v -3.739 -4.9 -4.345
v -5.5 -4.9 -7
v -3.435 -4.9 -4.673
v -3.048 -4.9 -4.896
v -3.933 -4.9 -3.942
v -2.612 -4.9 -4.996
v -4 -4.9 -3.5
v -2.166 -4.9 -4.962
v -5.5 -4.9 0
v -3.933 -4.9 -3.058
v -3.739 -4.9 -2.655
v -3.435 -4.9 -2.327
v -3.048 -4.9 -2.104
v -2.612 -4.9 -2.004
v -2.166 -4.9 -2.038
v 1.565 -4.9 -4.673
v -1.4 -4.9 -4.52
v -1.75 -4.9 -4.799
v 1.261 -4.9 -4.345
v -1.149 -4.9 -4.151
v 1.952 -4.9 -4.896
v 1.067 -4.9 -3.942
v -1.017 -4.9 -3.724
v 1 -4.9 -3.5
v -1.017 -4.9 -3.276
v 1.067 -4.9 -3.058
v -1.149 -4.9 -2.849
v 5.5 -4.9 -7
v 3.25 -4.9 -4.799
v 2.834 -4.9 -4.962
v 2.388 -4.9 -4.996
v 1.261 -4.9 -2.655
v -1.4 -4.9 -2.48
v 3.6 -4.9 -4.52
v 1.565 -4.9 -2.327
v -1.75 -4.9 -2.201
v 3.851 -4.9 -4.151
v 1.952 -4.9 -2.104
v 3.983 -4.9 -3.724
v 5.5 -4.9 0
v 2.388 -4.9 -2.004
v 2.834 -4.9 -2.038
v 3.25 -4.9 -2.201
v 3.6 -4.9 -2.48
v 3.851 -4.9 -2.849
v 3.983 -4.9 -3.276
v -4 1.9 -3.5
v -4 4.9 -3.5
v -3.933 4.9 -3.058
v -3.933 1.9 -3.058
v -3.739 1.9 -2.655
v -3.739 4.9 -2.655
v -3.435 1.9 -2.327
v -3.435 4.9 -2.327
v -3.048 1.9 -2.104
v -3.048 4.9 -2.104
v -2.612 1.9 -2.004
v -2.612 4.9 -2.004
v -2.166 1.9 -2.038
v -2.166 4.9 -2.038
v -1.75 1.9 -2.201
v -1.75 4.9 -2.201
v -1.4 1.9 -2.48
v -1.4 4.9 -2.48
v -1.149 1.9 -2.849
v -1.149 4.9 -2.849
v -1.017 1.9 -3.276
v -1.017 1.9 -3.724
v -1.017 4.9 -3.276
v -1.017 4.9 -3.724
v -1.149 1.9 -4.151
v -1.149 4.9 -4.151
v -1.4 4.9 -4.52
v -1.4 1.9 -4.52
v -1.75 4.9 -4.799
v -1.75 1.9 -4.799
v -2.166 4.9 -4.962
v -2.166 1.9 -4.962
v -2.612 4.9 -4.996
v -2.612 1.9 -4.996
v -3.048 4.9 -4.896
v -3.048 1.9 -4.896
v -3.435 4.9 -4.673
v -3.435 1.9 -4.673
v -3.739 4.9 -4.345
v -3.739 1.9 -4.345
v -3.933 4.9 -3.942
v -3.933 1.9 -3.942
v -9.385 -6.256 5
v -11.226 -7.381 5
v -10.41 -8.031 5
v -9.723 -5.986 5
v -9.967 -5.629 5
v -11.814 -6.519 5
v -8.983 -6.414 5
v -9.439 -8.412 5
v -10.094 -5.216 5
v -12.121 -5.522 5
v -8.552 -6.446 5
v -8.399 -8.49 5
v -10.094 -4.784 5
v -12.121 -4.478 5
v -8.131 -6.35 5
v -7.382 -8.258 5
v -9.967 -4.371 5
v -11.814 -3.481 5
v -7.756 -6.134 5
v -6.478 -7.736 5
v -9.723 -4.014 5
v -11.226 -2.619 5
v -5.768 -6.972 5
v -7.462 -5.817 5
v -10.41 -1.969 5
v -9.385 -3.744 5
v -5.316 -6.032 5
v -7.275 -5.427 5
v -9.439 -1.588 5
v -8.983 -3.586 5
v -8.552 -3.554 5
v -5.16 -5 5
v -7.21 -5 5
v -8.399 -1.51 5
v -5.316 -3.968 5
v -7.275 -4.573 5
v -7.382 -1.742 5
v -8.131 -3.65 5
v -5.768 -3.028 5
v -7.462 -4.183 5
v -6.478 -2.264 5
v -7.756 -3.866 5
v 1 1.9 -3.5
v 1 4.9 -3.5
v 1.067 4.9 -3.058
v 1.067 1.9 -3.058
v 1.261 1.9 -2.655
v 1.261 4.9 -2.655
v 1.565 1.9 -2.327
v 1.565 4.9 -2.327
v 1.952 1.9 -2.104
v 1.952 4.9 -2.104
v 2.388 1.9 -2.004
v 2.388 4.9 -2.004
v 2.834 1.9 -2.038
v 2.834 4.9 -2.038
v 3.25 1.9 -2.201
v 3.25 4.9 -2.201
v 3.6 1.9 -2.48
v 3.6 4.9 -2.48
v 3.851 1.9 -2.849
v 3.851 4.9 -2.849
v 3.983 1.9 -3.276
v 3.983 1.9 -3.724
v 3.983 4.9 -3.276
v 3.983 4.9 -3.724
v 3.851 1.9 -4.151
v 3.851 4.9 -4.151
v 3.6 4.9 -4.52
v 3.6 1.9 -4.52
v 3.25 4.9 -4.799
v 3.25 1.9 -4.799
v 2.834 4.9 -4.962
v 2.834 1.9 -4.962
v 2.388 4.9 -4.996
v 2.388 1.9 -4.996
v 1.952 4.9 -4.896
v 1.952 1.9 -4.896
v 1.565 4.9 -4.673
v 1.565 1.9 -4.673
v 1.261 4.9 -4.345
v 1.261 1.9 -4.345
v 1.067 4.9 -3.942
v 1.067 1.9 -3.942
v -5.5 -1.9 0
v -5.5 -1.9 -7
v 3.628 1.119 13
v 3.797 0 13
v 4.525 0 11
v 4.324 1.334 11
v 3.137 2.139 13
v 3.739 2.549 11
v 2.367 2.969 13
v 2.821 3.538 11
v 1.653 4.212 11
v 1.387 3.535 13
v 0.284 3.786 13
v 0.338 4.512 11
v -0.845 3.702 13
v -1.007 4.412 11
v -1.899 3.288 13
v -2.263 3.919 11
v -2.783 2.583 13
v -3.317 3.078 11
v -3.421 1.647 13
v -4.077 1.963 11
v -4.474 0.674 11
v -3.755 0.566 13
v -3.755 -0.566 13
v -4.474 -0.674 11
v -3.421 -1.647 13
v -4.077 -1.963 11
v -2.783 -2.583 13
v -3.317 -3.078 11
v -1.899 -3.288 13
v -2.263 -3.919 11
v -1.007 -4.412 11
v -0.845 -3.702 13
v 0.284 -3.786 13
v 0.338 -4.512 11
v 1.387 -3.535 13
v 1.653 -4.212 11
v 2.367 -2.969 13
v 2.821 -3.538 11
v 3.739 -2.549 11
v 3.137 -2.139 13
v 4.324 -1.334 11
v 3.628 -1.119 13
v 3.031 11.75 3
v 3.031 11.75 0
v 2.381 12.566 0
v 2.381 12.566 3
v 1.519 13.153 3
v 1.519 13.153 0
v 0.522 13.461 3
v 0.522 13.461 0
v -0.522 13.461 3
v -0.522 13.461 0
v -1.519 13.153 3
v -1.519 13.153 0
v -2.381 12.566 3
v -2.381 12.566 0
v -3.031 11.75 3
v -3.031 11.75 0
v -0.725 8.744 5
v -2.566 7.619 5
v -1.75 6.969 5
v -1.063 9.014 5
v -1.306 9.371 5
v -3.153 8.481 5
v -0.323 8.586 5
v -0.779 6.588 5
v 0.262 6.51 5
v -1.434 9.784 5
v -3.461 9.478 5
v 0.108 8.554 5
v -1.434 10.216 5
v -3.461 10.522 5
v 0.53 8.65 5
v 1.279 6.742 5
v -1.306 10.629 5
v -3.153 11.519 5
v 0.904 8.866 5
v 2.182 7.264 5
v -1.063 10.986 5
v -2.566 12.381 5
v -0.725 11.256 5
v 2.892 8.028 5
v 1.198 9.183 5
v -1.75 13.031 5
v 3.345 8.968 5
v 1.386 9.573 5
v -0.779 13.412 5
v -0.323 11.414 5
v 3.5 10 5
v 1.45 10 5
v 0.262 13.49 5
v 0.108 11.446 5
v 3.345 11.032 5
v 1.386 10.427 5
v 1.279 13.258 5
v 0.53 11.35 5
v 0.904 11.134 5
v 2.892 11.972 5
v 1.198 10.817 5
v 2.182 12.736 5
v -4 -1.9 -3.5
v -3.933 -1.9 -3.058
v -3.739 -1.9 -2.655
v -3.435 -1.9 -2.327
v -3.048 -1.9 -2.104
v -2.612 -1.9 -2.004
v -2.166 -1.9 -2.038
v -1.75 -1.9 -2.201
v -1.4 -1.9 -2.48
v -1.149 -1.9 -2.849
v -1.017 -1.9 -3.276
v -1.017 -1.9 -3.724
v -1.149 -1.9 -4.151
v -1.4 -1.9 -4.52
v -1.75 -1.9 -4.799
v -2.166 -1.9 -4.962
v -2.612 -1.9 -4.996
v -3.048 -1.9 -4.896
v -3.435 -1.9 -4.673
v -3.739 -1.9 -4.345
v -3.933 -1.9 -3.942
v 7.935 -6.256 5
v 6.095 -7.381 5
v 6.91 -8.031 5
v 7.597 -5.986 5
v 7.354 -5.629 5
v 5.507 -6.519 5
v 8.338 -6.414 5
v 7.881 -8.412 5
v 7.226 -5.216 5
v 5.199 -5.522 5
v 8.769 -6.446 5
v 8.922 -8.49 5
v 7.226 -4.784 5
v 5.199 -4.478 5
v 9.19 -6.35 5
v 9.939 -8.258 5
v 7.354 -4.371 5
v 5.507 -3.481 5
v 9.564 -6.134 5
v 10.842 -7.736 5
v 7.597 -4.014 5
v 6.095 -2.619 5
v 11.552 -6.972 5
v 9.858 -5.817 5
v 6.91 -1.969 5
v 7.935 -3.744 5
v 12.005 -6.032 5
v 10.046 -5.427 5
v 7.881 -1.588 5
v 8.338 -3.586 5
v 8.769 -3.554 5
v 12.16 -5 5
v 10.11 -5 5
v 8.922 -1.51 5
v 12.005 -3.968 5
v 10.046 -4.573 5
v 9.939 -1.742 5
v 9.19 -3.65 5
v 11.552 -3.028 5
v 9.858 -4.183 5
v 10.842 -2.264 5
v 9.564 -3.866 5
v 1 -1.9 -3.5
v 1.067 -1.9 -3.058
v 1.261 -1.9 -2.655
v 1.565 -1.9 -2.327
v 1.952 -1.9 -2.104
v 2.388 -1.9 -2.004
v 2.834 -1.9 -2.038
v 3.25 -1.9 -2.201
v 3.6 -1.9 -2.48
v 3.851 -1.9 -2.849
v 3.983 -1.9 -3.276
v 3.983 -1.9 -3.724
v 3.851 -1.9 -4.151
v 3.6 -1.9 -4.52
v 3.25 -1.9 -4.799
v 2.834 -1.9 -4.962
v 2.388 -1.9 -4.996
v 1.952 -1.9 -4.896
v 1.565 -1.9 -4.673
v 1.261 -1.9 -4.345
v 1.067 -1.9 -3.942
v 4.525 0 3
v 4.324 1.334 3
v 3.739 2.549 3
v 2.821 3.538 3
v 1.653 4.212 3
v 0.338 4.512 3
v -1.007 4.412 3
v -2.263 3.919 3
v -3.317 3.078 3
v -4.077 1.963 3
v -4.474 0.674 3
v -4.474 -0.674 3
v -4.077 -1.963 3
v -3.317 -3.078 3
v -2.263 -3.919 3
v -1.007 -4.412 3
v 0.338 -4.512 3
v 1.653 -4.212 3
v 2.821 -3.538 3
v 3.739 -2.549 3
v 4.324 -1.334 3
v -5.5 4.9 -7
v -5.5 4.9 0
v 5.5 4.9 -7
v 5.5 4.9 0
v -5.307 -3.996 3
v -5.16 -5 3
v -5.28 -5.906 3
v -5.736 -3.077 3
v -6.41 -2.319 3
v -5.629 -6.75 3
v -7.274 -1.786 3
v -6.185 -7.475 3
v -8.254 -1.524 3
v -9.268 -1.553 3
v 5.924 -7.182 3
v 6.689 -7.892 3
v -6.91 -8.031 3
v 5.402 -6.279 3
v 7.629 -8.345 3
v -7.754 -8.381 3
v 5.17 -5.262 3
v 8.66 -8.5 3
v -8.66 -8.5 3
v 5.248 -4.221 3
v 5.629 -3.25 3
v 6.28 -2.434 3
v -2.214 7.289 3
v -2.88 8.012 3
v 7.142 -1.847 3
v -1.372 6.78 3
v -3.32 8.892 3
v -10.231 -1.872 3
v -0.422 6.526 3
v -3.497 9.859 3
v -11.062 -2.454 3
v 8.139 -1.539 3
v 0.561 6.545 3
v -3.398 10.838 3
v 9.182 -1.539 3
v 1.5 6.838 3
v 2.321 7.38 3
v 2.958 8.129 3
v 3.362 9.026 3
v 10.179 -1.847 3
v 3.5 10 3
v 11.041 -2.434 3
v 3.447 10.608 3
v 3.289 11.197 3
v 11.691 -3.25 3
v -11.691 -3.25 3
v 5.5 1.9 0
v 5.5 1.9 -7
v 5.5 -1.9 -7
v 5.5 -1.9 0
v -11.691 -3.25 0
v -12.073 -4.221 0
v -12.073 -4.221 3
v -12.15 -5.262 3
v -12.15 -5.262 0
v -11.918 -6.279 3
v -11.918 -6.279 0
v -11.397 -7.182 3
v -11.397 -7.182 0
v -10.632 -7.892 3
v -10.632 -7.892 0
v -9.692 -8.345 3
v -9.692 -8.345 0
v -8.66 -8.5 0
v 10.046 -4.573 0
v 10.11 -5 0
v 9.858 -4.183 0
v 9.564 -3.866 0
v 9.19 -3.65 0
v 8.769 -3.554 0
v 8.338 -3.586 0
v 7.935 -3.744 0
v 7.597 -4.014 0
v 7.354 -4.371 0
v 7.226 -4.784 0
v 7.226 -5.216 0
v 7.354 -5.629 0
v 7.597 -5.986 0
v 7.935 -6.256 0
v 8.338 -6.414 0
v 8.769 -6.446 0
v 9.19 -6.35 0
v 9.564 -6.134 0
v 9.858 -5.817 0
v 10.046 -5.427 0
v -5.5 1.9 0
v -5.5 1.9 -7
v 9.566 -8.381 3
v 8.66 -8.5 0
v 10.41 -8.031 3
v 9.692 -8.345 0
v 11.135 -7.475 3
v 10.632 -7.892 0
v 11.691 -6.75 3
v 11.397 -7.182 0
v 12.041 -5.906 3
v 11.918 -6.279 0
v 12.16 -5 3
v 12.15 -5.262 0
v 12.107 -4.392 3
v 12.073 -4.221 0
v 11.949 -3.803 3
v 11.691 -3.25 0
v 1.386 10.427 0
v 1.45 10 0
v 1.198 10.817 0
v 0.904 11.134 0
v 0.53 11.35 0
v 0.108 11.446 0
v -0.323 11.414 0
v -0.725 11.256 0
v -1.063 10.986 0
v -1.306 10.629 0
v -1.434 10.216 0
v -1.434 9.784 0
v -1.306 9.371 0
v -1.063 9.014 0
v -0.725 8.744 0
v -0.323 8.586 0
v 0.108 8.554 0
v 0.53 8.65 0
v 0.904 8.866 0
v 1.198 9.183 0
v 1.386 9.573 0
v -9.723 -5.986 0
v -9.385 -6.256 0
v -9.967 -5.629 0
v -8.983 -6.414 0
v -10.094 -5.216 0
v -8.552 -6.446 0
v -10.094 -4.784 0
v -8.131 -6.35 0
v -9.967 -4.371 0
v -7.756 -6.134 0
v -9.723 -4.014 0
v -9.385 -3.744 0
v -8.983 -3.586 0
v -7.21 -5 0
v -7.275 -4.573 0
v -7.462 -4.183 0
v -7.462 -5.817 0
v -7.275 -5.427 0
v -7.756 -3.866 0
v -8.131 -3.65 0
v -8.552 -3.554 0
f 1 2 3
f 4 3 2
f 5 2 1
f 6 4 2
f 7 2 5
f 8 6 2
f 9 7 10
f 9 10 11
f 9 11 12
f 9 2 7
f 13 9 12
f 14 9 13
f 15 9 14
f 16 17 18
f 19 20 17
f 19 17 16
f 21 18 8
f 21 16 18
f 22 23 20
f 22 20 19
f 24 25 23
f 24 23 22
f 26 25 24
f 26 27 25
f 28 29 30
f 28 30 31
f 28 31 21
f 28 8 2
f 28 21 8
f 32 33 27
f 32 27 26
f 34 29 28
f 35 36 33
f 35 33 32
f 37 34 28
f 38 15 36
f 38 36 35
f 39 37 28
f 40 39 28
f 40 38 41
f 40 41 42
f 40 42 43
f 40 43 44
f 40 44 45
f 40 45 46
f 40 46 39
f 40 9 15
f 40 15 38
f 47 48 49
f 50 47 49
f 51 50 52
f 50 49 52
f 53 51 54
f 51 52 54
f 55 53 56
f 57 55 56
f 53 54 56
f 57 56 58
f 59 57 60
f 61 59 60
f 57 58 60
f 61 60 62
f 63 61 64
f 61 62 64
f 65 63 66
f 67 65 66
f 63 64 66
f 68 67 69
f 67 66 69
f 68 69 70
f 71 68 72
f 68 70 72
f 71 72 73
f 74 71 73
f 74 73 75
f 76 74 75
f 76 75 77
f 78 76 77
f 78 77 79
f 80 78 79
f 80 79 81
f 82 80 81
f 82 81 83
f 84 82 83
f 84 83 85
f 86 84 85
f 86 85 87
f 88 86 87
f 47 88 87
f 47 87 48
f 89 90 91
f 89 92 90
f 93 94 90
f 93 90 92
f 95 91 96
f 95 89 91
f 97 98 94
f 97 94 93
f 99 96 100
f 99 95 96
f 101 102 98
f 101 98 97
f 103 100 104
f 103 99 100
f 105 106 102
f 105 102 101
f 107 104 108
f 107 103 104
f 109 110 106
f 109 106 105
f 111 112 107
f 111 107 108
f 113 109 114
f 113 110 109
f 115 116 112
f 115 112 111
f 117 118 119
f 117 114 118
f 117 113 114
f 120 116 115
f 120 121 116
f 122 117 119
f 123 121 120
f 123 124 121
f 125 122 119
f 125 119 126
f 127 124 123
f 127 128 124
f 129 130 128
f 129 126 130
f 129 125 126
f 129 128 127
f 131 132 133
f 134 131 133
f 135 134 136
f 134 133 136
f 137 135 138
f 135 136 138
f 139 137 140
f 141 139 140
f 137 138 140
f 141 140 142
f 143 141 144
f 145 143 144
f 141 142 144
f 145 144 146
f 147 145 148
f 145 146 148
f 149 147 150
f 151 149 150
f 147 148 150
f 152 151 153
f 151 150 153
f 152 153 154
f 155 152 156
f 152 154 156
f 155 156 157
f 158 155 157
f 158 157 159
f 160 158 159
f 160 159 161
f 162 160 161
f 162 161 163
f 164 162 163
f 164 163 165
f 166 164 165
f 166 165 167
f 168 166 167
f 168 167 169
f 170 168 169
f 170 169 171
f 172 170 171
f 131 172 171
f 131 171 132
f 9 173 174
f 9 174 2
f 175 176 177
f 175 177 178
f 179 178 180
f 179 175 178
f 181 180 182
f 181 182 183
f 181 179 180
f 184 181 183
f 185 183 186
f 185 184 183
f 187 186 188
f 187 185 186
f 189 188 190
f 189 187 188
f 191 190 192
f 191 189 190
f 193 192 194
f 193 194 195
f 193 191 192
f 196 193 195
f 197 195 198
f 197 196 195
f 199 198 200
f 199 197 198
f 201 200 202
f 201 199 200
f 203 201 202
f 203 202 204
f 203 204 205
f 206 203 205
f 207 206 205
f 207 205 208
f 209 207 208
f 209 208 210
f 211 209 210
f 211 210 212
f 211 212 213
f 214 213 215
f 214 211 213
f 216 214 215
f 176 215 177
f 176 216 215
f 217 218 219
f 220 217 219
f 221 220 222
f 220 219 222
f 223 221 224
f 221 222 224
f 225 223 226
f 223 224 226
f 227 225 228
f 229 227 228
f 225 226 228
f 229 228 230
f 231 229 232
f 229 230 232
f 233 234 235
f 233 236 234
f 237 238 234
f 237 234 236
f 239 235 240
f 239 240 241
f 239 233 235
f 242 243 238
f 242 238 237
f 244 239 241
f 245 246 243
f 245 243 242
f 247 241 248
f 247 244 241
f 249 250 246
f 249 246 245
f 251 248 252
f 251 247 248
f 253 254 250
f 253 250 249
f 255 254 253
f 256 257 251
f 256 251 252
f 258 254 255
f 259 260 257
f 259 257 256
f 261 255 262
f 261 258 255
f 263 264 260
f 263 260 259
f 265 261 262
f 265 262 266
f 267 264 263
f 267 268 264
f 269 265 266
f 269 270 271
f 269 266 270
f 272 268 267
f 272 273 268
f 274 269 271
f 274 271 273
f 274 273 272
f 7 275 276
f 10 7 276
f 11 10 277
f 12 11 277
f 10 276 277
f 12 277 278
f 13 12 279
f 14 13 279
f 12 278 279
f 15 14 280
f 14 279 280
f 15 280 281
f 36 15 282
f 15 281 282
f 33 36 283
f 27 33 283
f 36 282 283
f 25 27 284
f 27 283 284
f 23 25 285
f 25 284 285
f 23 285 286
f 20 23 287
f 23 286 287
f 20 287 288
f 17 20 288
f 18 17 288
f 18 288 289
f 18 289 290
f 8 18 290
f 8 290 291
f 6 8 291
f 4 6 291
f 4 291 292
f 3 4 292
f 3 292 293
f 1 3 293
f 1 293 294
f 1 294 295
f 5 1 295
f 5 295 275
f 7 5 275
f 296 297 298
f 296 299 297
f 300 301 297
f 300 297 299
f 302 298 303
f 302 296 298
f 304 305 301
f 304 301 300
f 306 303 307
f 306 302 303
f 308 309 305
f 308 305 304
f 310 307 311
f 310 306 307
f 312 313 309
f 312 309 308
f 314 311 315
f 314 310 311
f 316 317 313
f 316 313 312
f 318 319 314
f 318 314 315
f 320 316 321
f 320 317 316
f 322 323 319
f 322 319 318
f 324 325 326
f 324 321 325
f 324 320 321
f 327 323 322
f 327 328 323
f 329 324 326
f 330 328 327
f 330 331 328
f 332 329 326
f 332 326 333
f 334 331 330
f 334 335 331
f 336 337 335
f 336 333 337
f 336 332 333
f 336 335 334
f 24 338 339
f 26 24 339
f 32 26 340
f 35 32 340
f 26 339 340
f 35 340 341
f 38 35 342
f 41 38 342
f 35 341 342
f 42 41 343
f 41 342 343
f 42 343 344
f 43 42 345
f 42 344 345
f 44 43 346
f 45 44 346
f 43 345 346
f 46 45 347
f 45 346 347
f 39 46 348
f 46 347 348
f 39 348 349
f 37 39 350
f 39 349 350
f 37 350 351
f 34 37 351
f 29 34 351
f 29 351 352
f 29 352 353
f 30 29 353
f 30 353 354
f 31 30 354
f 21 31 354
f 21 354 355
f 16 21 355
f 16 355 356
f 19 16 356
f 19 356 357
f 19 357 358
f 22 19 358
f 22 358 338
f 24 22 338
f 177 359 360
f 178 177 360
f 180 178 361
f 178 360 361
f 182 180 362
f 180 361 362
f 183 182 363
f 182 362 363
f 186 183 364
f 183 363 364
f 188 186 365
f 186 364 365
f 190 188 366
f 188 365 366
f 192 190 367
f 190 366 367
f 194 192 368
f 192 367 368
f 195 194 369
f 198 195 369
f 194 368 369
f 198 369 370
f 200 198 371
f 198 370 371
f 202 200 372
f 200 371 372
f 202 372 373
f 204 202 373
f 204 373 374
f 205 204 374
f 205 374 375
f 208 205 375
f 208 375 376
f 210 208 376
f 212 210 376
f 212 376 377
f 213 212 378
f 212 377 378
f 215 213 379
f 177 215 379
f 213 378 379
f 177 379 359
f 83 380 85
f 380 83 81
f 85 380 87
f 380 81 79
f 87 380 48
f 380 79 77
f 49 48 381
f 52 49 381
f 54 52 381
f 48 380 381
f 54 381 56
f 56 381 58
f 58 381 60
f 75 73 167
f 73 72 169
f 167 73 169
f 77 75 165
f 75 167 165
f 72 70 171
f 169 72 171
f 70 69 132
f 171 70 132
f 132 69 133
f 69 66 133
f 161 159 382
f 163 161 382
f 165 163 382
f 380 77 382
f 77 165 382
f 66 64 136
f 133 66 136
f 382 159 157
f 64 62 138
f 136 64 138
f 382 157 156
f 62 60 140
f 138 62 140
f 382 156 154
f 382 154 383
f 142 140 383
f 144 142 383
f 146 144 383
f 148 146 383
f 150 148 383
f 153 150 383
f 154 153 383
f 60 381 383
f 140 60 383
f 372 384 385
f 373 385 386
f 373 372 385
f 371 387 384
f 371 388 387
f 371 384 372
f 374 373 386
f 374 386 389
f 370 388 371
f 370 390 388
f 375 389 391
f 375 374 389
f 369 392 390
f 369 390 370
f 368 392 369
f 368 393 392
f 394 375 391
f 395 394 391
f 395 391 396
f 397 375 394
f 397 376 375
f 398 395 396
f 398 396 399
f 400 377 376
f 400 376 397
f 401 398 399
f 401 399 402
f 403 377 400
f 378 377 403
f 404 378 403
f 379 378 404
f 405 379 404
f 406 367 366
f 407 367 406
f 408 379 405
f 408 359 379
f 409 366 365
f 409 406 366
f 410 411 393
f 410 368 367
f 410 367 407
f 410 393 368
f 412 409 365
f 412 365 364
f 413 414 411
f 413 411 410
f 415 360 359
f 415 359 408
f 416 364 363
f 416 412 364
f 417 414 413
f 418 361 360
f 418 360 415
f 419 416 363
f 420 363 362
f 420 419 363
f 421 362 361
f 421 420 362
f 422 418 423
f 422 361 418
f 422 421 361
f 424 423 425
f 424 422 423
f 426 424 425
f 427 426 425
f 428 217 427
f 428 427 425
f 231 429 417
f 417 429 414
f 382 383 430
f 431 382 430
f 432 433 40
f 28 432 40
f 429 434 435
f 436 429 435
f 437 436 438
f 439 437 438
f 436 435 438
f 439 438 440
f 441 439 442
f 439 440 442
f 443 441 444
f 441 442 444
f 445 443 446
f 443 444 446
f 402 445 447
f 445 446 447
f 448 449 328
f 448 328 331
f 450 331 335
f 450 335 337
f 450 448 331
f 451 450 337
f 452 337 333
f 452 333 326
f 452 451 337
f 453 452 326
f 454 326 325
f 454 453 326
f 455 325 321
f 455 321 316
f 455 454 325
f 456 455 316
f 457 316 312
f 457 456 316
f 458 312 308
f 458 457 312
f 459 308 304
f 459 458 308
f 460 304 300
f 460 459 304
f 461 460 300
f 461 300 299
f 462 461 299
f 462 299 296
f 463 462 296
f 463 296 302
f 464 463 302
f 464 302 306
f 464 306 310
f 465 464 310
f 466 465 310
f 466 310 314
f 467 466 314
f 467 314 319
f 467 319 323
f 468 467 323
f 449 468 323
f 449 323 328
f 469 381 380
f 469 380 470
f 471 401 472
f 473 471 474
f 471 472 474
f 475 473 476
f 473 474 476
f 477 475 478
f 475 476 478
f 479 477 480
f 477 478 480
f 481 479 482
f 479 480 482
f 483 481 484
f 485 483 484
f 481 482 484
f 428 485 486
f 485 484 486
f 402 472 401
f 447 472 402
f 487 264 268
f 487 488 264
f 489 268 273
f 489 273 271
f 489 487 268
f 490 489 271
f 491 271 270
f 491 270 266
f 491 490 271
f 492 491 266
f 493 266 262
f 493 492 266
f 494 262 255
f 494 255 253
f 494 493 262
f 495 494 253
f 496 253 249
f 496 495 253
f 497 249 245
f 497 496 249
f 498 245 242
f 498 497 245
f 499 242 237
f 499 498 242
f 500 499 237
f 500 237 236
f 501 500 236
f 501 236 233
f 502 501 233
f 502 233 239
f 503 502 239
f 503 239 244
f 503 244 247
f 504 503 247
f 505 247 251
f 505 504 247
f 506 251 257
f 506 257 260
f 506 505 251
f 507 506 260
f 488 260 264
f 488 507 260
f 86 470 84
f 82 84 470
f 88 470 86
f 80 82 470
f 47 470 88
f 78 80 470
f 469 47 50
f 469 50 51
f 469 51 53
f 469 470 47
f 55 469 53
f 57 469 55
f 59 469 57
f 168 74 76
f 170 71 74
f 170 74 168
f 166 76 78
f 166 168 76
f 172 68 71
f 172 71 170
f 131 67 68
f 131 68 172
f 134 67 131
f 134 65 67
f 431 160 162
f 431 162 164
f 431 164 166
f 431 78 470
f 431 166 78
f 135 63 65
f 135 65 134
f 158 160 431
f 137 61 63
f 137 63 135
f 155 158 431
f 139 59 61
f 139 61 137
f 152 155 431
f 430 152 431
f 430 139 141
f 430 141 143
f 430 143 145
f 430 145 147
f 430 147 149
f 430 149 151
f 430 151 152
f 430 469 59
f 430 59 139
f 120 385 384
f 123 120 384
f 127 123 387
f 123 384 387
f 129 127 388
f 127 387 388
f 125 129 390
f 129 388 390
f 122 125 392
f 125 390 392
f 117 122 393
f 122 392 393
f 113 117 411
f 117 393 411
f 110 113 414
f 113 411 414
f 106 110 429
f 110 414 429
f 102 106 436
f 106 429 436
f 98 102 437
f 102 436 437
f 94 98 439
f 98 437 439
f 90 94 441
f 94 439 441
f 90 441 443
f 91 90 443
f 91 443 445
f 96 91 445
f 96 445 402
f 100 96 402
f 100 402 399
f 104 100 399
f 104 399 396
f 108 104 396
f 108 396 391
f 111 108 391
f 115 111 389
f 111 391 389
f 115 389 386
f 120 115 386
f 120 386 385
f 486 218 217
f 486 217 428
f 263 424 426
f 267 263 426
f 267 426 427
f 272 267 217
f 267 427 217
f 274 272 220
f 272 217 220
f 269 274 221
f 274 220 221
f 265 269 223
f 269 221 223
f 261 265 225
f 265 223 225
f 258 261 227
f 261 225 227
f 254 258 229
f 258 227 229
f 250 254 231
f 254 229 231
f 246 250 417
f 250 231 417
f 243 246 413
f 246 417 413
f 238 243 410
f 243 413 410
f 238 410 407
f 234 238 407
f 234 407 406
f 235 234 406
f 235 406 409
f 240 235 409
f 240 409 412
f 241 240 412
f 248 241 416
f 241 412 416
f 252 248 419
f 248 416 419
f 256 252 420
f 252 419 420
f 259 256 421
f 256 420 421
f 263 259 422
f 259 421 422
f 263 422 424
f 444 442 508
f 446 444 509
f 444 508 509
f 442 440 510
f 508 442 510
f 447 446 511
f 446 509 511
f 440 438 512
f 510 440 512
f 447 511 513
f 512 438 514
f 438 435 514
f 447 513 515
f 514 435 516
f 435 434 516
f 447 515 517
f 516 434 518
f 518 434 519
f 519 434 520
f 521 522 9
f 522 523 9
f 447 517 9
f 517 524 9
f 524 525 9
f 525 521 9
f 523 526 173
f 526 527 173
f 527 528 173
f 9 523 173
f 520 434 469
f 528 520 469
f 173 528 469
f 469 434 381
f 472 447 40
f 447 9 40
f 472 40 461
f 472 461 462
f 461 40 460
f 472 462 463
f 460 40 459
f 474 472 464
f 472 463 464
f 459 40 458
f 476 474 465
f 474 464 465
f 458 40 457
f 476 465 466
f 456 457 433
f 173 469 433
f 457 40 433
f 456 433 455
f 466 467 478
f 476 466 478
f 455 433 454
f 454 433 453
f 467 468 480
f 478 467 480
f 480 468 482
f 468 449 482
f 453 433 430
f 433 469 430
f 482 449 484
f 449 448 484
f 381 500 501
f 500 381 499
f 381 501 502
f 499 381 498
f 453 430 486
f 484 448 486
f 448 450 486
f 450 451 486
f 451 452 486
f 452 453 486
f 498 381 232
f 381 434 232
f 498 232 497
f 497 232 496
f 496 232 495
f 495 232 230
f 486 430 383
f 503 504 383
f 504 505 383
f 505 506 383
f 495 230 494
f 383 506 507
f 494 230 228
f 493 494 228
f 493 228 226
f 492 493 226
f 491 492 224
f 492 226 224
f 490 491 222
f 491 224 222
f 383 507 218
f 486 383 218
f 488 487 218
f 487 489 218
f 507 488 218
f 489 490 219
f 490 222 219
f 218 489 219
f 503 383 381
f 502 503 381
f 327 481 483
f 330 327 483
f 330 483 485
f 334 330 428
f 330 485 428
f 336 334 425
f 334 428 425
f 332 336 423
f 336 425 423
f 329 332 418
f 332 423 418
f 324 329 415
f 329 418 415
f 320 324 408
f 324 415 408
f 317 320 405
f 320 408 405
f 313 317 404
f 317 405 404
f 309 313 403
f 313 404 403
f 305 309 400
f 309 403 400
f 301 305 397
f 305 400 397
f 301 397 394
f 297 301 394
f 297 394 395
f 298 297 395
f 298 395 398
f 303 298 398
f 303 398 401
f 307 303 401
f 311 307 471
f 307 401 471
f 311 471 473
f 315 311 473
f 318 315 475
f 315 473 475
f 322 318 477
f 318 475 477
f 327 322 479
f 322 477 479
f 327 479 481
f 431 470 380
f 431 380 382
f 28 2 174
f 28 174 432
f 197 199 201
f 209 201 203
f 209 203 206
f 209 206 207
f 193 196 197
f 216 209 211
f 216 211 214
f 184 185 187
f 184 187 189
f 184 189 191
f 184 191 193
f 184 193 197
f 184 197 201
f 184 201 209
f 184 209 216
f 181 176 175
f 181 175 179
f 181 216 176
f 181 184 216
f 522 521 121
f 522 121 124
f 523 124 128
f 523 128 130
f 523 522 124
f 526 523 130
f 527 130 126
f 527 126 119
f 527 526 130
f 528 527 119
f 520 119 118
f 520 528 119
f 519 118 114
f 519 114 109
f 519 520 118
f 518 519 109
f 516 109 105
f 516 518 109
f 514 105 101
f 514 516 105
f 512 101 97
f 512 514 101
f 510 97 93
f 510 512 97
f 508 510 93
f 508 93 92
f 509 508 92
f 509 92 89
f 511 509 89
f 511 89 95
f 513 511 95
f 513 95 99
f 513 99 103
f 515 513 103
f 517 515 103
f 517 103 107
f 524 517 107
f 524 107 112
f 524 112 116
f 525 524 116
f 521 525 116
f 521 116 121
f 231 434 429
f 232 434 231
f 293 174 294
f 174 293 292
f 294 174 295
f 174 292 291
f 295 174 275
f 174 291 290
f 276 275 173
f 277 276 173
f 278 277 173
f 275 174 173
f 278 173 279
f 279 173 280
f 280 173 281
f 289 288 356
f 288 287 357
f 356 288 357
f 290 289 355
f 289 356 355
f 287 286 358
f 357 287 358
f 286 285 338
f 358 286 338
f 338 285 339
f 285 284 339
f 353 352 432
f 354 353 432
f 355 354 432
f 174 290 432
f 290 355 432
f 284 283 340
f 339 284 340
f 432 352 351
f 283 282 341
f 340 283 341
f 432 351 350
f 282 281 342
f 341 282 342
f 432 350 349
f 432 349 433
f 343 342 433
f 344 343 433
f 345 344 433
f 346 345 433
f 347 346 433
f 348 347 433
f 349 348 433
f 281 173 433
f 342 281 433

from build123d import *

# Parameters (mm, degrees)
SKETCH_R      = 1.45
PAD_DEPTH     = 3
SKETCH001_W   = 11
SKETCH001_H   = 3
PAD001_DEPTH  = 7
SKETCH002_R   = 1.5
POCKET_DEPTH  = 9.8
SKETCH003_R   = 3.5
SKETCH003_R_2 = 1.45
PAD002_DEPTH  = 2
SKETCH004_R   = 4.525
PAD003_DEPTH  = 10
CHAMFER_ANGLE = 20
CHAMFER_SIZE  = 2


with BuildPart() as part:
    # Sketch → Pad (new body)
    with BuildSketch(Plane.XY):
        with BuildLine():
            ThreePointArc((3.031089, 11.75), (0, 13.5), (-3.031089, 11.75))
            Line((-11.691343, -3.25), (-3.031089, 11.75))
            ThreePointArc((-11.691343, -3.25), (-11.691343, -6.75), (-8.660254, -8.5))
            Line((8.660254, -8.5), (-8.660254, -8.5))
            ThreePointArc((8.660254, -8.5), (11.691343, -6.75), (11.691343, -3.25))
            Line((3.031089, 11.75), (11.691343, -3.25))
        make_face()
        with Locations((0, 10)):
            Circle(SKETCH_R, mode=Mode.SUBTRACT)
        with Locations((8.660254, -5)):
            Circle(SKETCH_R, mode=Mode.SUBTRACT)
        with Locations((-8.660254, -5)):
            Circle(SKETCH_R, mode=Mode.SUBTRACT)
    extrude(amount=PAD_DEPTH)

    # Sketch001 (on Face10 of Pad) → Pad001 (join)
    with BuildSketch(Plane(origin=(0, 0, 0), x_dir=(1, 0, 0), z_dir=(0, 0, -1))):
        with Locations((0, 3.4)):
            Rectangle(SKETCH001_W, SKETCH001_H)
        with Locations((0, -3.4)):
            Rectangle(SKETCH001_W, SKETCH001_H)
    extrude(amount=PAD001_DEPTH)

    # Sketch002 (on Face18 of Pad001) → Pocket (cut)
    with BuildSketch(Plane(origin=(0, 4.9, 0), x_dir=(-1, 0, 0), z_dir=(0, 1, 0))):
        with Locations((-2.5, -3.5)):
            Circle(SKETCH002_R)
        with Locations((2.5, -3.5)):
            Circle(SKETCH002_R)
    extrude(amount=-POCKET_DEPTH, mode=Mode.SUBTRACT)

    # Sketch003 (on Face5 of Pocket) → Pad002 (join)
    with BuildSketch(Plane.XY.offset(3)):
        with Locations((0, 10)):
            Circle(SKETCH003_R)
        with Locations((0, 10)):
            Circle(SKETCH003_R_2, mode=Mode.SUBTRACT)
        with Locations((8.660254, -5)):
            Circle(SKETCH003_R)
        with Locations((8.660254, -5)):
            Circle(SKETCH003_R_2, mode=Mode.SUBTRACT)
        with Locations((-8.660254, -5)):
            Circle(SKETCH003_R)
        with Locations((-8.660254, -5)):
            Circle(SKETCH003_R_2, mode=Mode.SUBTRACT)
    extrude(amount=PAD002_DEPTH)

    # Sketch004 (on Face4 of Pad002) → Pad003 (join)
    with BuildSketch(Plane.XY.offset(3)):
        Circle(SKETCH004_R)
    extrude(amount=PAD003_DEPTH)

    # Chamfer
    chamfer_edges = [part.edges().sort_by_distance(p)[0] for p in [
        (-4.525, 0, 13),
    ]]
    chamfer_side = part.faces().sort_by_distance((-4.525, 0, 8))[0]
    chamfer(chamfer_edges, length=CHAMFER_SIZE, angle=CHAMFER_ANGLE, reference=chamfer_side)


solid = part.part
